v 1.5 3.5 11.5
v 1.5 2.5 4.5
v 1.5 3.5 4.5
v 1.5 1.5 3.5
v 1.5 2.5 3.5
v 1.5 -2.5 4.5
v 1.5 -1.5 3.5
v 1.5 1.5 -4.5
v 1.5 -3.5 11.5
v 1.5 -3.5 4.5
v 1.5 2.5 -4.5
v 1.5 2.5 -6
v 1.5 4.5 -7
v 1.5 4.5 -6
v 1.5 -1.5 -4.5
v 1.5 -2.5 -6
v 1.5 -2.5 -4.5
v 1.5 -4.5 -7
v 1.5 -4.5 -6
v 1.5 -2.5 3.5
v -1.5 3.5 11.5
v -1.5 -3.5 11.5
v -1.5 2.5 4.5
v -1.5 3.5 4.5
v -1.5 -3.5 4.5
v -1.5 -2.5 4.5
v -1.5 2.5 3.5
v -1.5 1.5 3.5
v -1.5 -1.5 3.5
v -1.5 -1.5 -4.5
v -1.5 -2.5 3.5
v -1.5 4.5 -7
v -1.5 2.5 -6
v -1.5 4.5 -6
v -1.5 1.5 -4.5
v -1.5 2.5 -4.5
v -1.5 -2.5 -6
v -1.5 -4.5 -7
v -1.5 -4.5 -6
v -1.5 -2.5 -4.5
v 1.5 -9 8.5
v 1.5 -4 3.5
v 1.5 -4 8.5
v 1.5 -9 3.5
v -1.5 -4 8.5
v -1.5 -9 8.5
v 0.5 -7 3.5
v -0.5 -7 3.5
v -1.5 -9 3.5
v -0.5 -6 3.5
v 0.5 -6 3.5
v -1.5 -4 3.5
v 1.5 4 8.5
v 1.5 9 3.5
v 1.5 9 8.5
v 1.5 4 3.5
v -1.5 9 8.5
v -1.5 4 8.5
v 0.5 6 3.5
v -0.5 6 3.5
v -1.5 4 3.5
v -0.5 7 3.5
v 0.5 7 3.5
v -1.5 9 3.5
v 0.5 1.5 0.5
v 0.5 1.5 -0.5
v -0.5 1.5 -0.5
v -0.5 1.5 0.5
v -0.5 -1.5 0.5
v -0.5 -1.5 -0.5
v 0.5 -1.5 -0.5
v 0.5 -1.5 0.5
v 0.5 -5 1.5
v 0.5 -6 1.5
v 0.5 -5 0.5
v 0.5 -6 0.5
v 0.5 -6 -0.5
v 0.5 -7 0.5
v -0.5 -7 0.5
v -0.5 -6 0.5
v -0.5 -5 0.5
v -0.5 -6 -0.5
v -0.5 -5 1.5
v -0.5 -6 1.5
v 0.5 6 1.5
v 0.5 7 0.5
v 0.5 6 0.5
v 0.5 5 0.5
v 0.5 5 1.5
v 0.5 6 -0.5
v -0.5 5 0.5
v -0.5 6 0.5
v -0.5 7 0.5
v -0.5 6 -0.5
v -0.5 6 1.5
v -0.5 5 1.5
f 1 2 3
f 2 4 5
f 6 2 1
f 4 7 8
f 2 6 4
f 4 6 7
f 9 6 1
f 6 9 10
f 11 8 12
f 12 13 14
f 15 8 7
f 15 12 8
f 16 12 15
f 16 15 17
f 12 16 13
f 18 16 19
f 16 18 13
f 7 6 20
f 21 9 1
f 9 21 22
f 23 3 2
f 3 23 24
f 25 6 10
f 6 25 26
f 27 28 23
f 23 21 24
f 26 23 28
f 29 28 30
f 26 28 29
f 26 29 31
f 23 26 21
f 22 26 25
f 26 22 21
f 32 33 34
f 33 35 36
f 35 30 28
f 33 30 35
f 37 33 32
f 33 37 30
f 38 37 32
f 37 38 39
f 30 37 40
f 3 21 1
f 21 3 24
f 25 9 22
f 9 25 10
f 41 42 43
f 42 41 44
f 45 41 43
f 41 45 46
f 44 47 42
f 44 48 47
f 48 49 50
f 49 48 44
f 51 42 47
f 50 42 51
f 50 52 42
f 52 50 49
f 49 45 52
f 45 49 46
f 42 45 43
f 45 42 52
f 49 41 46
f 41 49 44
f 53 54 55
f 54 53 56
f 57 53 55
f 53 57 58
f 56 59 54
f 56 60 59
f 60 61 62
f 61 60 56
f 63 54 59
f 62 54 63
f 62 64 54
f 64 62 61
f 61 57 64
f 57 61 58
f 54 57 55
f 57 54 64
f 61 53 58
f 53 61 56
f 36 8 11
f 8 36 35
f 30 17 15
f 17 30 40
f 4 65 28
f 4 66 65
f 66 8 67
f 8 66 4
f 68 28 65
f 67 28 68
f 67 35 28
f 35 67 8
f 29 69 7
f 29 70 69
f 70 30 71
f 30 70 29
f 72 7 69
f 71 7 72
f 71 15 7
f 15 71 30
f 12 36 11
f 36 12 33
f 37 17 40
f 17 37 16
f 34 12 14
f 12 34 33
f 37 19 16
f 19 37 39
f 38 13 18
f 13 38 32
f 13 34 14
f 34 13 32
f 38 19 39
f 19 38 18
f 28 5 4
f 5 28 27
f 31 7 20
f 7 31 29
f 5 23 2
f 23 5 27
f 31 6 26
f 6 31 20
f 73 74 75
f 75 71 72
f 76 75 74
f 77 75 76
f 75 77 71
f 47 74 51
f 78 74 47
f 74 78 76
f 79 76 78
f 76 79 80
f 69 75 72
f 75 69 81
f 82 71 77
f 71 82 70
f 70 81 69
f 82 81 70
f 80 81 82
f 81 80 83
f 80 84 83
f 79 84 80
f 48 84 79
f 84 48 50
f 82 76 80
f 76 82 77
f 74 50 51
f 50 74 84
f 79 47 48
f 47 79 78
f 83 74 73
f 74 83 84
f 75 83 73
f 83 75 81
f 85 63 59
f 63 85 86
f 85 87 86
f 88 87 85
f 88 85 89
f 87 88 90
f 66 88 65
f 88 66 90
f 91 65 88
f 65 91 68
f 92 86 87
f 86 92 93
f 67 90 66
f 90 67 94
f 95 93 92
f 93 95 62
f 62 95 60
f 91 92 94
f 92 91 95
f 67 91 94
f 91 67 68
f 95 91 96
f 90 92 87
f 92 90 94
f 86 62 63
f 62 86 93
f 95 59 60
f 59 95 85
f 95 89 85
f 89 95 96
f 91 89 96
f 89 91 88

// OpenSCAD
cube(size=[3, 3, 9], center=true);
translate([0, 0, -5.5]) cube(size=[3, 5, 2], center=true);
translate([0, 0, -6.5]) cube(size=[3, 9, 1], center=true);
translate([0, 0, 4]) cube(size=[3, 5, 1], center=true);

translate([0, -3.5, 0]) cube(size=[1, 5, 1], center=true);
translate([0, -6.5, 3]) cube(size=[1, 1, 5], center=true);
translate([0, -5.5, 1]) cube(size=[1, 1, 1], center=true);

translate([0, 3.5, 0]) cube(size=[1, 5, 1], center=true);
translate([0, 6.5, 3]) cube(size=[1, 1, 5], center=true);
translate([0, 5.5, 1]) cube(size=[1, 1, 1], center=true);

color([0/255, 255/255, 0/255]) {
  translate([0, 0, 8]) cube(size=[3, 7, 7], center=true);
  translate([0, -6.5, 6]) cube(size=[3, 5, 5], center=true);
  translate([0, 6.5, 6]) cube(size=[3, 5, 5], center=true);
}
